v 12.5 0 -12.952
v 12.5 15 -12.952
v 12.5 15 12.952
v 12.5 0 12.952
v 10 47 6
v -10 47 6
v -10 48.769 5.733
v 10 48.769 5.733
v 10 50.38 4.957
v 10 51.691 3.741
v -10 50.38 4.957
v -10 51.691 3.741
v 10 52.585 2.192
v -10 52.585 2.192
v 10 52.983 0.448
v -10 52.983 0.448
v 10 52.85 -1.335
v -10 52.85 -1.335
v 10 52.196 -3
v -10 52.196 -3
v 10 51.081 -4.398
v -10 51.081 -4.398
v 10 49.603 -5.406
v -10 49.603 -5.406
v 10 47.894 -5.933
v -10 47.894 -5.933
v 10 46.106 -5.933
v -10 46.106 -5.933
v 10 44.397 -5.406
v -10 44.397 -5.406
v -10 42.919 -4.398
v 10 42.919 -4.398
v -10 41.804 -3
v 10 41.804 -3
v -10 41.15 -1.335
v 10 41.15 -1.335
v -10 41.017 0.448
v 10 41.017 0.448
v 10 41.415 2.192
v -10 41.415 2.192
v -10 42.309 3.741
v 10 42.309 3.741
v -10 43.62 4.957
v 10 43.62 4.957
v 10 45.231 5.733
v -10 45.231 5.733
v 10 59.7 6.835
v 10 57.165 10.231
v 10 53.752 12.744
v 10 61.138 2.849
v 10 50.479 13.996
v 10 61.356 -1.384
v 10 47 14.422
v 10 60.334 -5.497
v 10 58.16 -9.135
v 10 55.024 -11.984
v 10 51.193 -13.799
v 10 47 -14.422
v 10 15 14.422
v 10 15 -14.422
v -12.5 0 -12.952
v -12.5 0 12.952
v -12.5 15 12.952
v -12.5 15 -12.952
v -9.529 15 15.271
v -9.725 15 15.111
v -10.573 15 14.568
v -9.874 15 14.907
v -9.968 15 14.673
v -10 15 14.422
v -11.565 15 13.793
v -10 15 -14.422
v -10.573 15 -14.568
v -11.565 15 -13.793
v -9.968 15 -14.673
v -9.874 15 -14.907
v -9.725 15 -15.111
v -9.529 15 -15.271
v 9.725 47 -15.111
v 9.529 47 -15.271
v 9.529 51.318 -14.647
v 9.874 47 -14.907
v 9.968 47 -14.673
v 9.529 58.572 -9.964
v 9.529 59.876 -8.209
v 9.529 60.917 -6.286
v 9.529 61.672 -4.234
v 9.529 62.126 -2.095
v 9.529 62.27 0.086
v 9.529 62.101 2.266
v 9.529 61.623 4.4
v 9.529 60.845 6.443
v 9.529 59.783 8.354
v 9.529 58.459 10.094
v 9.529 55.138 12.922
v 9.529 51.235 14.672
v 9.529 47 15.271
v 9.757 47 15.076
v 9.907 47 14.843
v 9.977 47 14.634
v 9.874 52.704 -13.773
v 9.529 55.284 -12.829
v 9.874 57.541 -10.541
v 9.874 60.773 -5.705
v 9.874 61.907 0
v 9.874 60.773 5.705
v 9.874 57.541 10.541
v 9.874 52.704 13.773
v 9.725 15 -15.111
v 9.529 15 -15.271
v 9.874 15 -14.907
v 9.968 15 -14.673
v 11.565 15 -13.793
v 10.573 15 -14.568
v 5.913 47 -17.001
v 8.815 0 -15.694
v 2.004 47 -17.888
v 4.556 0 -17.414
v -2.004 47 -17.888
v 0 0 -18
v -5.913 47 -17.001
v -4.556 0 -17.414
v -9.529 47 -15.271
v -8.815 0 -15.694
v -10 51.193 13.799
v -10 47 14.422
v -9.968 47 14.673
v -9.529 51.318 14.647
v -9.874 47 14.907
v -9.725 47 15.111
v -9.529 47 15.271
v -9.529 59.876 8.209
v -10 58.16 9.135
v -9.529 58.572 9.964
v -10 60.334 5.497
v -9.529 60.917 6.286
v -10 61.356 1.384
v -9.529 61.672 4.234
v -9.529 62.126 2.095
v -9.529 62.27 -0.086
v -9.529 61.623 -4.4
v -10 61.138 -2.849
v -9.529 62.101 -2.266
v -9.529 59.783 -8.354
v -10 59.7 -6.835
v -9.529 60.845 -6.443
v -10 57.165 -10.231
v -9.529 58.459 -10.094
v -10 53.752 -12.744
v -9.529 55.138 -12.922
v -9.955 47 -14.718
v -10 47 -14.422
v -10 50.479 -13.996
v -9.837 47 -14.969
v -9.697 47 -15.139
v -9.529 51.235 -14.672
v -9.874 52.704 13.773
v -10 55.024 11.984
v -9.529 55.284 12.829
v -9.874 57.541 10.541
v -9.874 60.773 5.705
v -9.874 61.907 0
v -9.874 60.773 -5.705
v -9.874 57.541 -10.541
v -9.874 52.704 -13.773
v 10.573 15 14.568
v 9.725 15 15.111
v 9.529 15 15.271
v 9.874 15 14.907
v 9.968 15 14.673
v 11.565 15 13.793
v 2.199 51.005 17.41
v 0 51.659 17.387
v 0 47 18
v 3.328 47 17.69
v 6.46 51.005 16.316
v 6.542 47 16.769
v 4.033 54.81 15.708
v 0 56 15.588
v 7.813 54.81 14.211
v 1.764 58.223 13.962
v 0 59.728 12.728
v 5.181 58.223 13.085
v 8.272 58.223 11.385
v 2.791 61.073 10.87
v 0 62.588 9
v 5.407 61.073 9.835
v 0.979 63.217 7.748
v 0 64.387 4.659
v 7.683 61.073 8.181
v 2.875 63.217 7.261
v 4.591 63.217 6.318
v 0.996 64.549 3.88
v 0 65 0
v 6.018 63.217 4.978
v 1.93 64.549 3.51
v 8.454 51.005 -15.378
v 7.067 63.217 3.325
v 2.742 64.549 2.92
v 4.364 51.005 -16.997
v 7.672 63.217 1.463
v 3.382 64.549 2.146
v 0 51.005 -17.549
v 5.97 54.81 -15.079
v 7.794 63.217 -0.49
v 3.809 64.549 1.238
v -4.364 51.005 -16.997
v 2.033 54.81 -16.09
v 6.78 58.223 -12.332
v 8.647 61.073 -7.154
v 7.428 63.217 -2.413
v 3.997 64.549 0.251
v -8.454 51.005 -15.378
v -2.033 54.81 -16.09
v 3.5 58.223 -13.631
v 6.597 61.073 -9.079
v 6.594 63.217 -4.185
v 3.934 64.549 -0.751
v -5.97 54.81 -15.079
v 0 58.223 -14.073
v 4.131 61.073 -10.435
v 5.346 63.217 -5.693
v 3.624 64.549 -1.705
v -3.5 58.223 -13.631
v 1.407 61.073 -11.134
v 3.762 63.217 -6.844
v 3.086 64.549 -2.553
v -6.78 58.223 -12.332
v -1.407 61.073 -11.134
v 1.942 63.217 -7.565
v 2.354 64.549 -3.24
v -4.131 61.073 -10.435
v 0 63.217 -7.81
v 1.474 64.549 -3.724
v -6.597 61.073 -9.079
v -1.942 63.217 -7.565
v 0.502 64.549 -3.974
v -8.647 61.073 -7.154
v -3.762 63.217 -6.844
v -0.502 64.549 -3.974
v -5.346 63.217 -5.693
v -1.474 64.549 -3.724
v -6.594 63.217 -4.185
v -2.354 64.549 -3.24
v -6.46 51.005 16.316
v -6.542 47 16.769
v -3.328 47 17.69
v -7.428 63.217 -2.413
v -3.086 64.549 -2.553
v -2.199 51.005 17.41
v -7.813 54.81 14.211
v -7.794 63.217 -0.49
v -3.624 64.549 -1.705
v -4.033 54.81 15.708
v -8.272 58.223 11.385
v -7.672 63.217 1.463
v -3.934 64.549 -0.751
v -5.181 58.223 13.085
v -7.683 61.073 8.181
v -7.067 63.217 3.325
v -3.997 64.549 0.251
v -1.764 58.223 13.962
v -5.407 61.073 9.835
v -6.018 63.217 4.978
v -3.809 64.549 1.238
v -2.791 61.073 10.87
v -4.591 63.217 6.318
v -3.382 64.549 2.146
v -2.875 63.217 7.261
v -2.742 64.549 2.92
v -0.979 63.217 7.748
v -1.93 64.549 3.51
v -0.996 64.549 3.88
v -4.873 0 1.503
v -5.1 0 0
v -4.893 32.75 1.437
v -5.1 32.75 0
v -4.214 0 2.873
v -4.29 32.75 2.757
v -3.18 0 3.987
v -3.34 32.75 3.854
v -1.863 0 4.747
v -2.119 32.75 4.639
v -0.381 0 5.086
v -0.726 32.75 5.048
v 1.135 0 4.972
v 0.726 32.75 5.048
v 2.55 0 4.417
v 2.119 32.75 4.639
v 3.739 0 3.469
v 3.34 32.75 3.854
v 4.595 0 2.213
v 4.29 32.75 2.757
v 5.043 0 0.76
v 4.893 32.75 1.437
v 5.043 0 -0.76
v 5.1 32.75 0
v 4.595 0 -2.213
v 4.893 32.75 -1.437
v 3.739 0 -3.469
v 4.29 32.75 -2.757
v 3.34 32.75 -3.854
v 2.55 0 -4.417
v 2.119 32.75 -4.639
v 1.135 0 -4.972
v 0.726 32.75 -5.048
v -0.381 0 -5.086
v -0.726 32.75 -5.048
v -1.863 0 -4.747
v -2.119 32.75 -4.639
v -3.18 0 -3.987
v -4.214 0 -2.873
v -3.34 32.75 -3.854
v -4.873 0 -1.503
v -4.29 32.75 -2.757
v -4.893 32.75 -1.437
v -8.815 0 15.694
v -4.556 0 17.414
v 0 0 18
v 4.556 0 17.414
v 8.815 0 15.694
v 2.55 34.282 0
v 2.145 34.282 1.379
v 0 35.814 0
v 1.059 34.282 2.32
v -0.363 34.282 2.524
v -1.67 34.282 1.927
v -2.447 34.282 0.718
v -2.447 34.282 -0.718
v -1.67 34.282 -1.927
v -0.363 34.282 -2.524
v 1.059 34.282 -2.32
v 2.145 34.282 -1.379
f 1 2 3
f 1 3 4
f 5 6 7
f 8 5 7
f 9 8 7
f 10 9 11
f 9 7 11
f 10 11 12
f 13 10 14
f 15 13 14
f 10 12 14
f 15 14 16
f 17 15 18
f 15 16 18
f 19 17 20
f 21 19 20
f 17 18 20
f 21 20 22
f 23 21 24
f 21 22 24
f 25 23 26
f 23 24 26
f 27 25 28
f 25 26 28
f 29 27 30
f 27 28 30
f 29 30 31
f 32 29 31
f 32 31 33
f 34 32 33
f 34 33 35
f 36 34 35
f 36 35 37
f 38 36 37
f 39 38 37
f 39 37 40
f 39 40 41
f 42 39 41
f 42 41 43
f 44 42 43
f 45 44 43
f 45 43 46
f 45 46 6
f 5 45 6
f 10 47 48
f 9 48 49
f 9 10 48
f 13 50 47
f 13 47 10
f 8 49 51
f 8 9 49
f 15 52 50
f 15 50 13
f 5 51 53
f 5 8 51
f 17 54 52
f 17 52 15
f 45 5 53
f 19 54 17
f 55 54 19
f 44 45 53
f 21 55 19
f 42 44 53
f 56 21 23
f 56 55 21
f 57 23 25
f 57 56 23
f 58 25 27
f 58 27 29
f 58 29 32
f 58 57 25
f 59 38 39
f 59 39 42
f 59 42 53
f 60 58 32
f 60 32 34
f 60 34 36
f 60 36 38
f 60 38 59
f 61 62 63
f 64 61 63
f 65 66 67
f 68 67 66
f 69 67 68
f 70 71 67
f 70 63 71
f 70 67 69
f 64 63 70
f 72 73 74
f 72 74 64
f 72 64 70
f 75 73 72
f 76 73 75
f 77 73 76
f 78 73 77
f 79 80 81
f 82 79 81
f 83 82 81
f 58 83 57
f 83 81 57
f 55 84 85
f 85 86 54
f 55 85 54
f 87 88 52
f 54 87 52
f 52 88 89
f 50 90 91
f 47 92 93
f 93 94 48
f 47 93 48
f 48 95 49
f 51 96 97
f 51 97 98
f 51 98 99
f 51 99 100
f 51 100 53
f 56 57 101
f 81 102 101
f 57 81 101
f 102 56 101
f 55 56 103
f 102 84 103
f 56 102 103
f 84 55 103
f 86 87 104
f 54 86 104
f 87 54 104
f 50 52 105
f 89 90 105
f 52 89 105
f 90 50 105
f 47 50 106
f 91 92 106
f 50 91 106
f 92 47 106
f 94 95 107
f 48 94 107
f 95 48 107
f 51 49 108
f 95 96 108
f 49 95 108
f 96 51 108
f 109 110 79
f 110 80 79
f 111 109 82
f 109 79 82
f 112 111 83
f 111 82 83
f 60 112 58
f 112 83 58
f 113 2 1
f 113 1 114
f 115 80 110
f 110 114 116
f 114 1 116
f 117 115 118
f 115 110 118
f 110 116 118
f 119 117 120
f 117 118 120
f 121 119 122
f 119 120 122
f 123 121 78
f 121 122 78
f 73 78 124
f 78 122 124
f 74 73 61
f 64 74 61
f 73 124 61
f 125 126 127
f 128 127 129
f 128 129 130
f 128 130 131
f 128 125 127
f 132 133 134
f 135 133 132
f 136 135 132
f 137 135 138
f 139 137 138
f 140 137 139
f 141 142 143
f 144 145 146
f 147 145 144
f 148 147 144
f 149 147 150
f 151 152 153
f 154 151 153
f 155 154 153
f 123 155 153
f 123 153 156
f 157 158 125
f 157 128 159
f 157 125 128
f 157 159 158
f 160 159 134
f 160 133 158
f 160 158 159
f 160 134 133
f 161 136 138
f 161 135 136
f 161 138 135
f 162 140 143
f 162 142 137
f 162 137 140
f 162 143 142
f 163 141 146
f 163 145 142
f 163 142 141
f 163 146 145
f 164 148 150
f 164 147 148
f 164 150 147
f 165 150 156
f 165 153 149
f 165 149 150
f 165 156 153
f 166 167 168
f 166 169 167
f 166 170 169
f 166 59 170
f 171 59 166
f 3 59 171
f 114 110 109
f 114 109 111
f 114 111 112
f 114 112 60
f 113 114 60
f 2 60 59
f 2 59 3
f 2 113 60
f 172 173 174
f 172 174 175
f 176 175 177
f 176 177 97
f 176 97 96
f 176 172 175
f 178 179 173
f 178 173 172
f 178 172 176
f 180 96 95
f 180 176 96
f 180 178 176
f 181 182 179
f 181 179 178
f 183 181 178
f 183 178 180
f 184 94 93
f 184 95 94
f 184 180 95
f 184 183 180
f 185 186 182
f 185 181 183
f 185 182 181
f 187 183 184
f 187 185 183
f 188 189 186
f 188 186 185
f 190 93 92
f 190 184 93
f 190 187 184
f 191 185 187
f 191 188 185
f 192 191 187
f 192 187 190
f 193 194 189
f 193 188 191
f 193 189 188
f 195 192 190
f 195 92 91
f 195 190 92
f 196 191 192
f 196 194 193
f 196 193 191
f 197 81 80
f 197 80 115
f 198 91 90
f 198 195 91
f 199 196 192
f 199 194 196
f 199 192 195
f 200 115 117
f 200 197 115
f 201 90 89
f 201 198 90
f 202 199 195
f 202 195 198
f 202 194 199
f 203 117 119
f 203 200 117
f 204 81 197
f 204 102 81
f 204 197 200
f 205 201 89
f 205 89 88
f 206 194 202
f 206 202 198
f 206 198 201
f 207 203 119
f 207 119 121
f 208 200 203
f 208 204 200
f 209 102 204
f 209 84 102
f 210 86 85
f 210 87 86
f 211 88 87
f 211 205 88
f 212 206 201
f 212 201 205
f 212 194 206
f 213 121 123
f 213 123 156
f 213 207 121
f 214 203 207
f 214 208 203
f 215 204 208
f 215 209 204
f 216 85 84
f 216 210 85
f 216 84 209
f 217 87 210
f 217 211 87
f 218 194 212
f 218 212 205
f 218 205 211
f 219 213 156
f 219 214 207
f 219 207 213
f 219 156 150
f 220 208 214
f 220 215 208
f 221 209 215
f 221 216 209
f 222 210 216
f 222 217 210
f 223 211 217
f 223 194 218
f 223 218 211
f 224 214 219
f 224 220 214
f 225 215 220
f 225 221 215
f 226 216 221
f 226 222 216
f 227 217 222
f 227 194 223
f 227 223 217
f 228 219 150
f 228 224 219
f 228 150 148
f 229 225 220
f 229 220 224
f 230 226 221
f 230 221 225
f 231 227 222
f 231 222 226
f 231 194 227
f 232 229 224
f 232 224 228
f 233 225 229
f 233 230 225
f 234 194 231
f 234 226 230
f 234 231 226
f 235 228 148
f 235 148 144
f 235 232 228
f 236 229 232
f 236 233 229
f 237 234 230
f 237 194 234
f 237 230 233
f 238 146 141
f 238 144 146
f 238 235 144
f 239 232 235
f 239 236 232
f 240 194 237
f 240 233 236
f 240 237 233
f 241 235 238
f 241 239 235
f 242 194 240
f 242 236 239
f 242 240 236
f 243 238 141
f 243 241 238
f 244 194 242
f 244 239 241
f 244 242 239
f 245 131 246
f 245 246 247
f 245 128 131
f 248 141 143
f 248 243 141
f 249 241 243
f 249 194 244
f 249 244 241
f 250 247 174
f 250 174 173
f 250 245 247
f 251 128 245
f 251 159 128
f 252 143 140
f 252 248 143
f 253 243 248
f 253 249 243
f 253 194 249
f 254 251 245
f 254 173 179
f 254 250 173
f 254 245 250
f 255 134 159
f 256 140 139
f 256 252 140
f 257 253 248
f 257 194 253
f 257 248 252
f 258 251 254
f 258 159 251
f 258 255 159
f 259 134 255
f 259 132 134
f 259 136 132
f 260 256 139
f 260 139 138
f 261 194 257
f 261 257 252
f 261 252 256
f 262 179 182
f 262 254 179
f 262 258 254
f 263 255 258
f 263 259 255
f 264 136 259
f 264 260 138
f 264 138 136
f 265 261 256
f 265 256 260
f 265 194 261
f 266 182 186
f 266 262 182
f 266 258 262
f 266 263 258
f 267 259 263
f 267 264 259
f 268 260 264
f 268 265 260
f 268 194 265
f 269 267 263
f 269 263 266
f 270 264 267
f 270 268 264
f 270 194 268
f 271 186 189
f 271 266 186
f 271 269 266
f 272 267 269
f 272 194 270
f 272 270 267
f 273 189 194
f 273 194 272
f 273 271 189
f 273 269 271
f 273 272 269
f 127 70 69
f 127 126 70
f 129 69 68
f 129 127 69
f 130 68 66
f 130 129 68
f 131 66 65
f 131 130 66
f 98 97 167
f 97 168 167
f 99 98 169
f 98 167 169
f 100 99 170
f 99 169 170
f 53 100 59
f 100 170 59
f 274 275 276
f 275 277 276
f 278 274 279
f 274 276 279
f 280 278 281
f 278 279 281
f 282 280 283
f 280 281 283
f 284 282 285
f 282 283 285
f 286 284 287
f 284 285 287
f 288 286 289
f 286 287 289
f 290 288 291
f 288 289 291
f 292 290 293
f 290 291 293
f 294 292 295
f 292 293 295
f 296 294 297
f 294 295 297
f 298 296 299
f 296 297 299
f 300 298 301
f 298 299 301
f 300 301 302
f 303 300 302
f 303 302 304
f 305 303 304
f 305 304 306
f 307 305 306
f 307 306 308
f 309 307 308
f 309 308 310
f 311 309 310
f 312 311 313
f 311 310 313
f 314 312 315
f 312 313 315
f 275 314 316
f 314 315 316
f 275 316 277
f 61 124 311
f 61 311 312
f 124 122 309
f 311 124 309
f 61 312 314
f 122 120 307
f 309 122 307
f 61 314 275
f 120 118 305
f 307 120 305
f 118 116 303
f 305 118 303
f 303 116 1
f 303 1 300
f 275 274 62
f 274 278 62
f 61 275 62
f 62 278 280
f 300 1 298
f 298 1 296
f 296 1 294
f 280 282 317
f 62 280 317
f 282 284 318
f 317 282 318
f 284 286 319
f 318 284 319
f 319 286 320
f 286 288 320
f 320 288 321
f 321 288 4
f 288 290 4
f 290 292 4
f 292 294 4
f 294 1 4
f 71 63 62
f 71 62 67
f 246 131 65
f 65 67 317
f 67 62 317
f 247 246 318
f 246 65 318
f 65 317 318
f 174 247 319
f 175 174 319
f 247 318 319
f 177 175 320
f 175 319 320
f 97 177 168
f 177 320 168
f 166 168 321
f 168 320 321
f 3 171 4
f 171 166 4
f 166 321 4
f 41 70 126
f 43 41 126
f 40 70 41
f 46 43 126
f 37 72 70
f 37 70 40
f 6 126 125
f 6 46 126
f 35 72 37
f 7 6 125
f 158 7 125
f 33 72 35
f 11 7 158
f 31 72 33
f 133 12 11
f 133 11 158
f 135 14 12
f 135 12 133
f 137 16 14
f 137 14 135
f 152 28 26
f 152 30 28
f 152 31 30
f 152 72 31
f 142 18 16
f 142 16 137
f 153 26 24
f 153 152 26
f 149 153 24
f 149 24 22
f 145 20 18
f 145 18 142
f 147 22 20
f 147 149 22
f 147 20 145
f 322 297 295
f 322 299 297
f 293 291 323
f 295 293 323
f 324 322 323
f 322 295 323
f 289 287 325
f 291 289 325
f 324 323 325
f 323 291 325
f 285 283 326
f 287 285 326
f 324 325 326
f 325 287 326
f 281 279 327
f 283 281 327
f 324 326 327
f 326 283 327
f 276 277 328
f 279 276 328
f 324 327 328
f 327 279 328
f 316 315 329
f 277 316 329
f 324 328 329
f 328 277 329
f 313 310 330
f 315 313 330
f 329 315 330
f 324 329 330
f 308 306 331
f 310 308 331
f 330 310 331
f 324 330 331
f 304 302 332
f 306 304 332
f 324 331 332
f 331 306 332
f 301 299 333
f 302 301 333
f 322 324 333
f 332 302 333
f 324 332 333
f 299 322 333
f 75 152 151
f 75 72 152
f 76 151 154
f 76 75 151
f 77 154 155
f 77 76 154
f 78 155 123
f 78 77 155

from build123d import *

# Parameters (mm, degrees)
SKETCH_1_R               = 18
EXTRUDE_1_DEPTH          = 65
FILLET_1_R               = 18
CUT_EXTRUDE_2_DEPTH      = 70.806876452
CUT_EXTRUDE_2_DEPTH_BACK = 70.806876452
SKETCH_2_OUTSIDE_W       = 54.514
SKETCH_2_OUTSIDE_H       = 83.514
SKETCH_3_R               = 6
CUT_EXTRUDE_3_DEPTH      = 80
M12X1_75_1_D             = 10.2
M12X1_75_1_DEPTH         = 32.75
M12X1_75_1_TIP           = 3.064389157
FILLET_2_R               = 1


with BuildPart() as part:
    # 草图1 → 拉伸1 (new body)
    with BuildSketch(Plane(origin=(0, 0, 0), x_dir=(1, 0, 0), z_dir=(0, 1, 0))):
        with Locations(Location((0, 0, 0), (0, 0, 270))):
            Circle(SKETCH_1_R)
    extrude(amount=EXTRUDE_1_DEPTH)

    # 圆角1
    fillet_1_edges = [part.edges().sort_by_distance(p)[0] for p in [
        (0, 65, -18),
    ]]
    fillet(fillet_1_edges, radius=FILLET_1_R)

    # 草图2 outside → 拉伸2 (cut, two sides: drawn at the far end of the back side and taken through both)
    with BuildSketch(Plane.XY.offset(-CUT_EXTRUDE_2_DEPTH_BACK)):
        with Locations((0, 32.5)):
            Rectangle(SKETCH_2_OUTSIDE_W, SKETCH_2_OUTSIDE_H)
        Polygon((-12.5, 0), (-12.5, 15), (-10, 15), (-10, 85.518474484), (10, 85.518474484), (10, 15), (12.5, 15), (12.5, 0), align=None, mode=Mode.SUBTRACT)
    extrude(amount=CUT_EXTRUDE_2_DEPTH + CUT_EXTRUDE_2_DEPTH_BACK, mode=Mode.SUBTRACT)

    # 草图3 → 拉伸3 (cut)
    with BuildSketch(Plane.ZY.offset(10)):
        with Locations((0, 47)):
            Circle(SKETCH_3_R)
    extrude(amount=-CUT_EXTRUDE_3_DEPTH, mode=Mode.SUBTRACT)

    # M12x1.75 螺纹孔1
    with Locations(Plane.XZ):
        with Locations((0, 0)):
            Hole(M12X1_75_1_D / 2, depth=M12X1_75_1_DEPTH)
            with Locations((0, 0, -(M12X1_75_1_DEPTH + M12X1_75_1_TIP / 2))):  # 118° drill point
                Cone(0, M12X1_75_1_D / 2, M12X1_75_1_TIP, mode=Mode.SUBTRACT)

    # 圆角2
    fillet_2_edges = [part.edges().sort_by_distance(p)[0] for p in [
        (-10, 31, -14.966629547),
        (-10, 31, 14.966629547),
        (10, 31, 14.966629547),
        (10, 31, -14.966629547),
        (10, 61.966629547, 0),
        (-10, 61.966629547, 0),
    ]]
    fillet(fillet_2_edges, radius=FILLET_2_R)


solid = part.part
